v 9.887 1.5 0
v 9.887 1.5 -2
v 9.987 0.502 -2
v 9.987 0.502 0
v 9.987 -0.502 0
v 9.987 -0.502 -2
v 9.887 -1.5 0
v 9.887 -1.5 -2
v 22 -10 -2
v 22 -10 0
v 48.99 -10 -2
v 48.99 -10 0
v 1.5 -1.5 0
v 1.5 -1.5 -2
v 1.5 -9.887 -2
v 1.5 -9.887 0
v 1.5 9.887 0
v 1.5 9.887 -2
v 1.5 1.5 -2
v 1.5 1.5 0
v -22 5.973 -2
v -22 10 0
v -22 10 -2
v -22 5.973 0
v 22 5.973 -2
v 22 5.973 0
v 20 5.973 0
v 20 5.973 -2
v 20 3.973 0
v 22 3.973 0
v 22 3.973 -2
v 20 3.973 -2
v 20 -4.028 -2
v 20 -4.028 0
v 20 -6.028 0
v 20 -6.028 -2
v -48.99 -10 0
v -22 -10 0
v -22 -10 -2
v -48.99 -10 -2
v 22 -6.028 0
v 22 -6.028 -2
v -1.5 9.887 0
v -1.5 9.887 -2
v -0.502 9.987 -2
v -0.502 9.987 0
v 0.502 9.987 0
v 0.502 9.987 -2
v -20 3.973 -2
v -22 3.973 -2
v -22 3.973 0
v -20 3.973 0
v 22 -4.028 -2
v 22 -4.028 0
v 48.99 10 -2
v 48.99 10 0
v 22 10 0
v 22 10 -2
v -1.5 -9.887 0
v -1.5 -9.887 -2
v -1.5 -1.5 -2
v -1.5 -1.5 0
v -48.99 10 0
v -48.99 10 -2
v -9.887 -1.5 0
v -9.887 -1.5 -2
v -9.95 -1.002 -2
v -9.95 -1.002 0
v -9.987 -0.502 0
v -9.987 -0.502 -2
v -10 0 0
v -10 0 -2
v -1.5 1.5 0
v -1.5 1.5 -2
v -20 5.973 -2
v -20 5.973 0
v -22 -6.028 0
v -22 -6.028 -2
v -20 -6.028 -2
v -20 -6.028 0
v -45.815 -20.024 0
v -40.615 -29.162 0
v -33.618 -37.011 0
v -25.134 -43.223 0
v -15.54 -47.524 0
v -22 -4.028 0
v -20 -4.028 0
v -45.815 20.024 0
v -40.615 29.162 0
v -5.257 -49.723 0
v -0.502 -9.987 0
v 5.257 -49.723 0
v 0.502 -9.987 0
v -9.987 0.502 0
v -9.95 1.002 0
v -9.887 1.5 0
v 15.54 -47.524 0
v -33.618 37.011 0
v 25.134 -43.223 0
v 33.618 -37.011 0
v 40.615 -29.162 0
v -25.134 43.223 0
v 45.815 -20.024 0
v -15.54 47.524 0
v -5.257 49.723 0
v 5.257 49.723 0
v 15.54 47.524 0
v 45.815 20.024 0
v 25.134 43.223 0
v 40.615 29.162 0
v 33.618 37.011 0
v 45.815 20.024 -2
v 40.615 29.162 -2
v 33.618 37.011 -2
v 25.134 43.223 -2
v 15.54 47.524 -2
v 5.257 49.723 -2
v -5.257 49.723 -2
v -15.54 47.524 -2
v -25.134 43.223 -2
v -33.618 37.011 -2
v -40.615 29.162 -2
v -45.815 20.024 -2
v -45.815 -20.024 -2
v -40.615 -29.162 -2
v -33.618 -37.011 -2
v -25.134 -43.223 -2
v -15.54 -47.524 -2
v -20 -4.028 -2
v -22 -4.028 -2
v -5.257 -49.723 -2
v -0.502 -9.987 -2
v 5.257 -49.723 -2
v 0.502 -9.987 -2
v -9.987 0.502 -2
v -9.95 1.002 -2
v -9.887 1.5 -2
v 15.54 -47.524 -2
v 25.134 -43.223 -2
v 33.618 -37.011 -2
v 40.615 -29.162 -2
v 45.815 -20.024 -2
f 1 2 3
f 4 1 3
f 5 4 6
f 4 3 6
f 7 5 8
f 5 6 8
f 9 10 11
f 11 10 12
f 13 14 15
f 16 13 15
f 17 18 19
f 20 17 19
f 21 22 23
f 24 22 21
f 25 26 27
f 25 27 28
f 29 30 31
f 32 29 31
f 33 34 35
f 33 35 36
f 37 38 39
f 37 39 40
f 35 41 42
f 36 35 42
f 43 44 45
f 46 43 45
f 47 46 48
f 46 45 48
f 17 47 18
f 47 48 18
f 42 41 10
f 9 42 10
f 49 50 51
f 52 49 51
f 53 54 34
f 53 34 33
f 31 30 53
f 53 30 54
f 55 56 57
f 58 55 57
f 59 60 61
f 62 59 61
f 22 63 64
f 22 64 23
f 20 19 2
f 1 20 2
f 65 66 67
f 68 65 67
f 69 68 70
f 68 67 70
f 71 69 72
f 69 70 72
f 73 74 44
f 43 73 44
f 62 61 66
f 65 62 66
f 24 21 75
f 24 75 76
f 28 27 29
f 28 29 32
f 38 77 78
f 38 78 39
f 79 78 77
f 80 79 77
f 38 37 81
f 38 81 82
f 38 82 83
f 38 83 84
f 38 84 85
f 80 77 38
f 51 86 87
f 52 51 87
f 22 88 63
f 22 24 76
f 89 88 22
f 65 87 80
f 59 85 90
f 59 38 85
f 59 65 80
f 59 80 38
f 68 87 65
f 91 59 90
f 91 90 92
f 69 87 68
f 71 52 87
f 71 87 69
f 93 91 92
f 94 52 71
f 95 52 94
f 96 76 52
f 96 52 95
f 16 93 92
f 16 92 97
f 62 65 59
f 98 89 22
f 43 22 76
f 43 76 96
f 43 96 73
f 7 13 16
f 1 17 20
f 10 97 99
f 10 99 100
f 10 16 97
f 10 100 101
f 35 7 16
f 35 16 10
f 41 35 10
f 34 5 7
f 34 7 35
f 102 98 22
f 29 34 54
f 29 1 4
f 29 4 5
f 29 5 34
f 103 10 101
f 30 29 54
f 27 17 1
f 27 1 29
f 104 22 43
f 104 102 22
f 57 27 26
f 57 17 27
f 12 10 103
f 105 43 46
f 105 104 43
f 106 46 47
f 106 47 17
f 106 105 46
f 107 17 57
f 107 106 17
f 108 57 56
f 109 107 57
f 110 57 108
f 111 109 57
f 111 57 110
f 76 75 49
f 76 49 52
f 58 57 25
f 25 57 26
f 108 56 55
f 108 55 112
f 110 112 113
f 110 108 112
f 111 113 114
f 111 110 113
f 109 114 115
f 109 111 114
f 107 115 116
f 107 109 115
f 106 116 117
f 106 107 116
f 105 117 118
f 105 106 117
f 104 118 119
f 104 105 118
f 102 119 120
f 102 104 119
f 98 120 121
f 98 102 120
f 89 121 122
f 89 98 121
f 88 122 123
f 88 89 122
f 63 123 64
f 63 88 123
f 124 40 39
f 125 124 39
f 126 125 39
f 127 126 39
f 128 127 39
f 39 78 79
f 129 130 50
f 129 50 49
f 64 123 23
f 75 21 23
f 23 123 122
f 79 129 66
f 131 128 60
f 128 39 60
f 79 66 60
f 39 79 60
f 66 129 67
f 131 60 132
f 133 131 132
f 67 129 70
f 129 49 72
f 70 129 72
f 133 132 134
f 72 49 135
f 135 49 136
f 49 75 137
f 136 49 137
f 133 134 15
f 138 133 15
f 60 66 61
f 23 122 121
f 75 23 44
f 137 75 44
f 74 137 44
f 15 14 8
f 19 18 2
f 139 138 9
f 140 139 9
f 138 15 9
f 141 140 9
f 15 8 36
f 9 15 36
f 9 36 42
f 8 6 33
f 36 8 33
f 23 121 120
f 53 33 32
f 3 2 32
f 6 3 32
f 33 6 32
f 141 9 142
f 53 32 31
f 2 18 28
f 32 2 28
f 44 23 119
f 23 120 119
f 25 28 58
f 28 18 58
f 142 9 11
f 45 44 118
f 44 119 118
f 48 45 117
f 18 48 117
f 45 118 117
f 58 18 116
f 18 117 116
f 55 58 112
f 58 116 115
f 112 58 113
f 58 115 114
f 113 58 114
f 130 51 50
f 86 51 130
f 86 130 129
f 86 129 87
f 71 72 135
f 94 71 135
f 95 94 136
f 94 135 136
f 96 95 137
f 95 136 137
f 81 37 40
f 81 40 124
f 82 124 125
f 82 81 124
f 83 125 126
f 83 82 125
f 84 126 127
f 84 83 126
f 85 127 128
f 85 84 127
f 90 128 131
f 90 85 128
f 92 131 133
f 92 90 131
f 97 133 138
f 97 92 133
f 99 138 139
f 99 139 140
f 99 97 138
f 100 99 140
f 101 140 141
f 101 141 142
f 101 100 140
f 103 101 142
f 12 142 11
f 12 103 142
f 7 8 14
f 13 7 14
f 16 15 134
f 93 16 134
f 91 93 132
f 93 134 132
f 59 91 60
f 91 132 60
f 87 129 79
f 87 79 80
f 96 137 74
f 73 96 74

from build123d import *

# Parameters (mm, degrees)
BOSS_EXTRUDE5_DEPTH = 2
CUT_EXTRUDE17_DEPTH = 2
SKETCH11_3_W        = 3
SKETCH11_3_H        = 3
CUT_EXTRUDE18_DEPTH = 2
CUT_EXTRUDE19_DEPTH = 2
SKETCH14_W          = 2.001486185
SKETCH14_H          = 2
CUT_EXTRUDE20_DEPTH = 2
SKETCH13_W          = 2.001486185
SKETCH13_H          = 2
CUT_EXTRUDE21_DEPTH = 2


with BuildPart() as part:
    # Sketch1 → Boss-Extrude5 (new body)
    with BuildSketch(Plane.XY):
        with BuildLine():
            Line((-22, 10), (-22, -10))
            Line((-22, -10), (-48.989794856, -10))
            ThreePointArc((-48.989794856, -10), (50, 0), (-48.989794856, 10))
            Line((-48.989794856, 10), (-22, 10))
        make_face()
    extrude(amount=-BOSS_EXTRUDE5_DEPTH)

    # Sketch11 → Cut-Extrude17 (cut)
    with BuildSketch(Plane(origin=(0, 0, -2), x_dir=(-1, 0, 0), z_dir=(0, 0, -1))):
        with BuildLine():
            Line((-1.5, 1.5), (1.5, 1.5))
            Line((1.5, 1.5), (1.5, 9.886859967))
            ThreePointArc((1.5, 9.886859967), (0, 10), (-1.5, 9.886859967))
            Line((-1.5, 9.886859967), (-1.5, 1.5))
        make_face()
    extrude(amount=-CUT_EXTRUDE17_DEPTH, mode=Mode.SUBTRACT)

    # Sketch11<3> → Cut-Extrude18 (cut)
    with BuildSketch(Plane(origin=(0, 0, -2), x_dir=(-1, 0, 0), z_dir=(0, 0, -1))):
        with BuildLine():
            Line((-9.886859967, -1.5), (-1.5, -1.5))
            Line((-1.5, -1.5), (-1.5, 1.5))
            Line((-1.5, 1.5), (-9.886859967, 1.5))
            ThreePointArc((-9.886859967, 1.5), (-10, 0), (-9.886859967, -1.5))
        make_face()
        with BuildLine():
            Line((1.5, 1.5), (1.5, -1.5))
            Line((1.5, -1.5), (9.886859967, -1.5))
            ThreePointArc((9.886859967, -1.5), (9.971674876, -0.752130419), (10, 0))
            ThreePointArc((10, 0), (9.971674876, 0.752130419), (9.886859967, 1.5))
            Line((9.886859967, 1.5), (1.5, 1.5))
        make_face()
        with BuildLine():
            Line((1.5, -9.886859967), (1.5, -1.5))
            Line((1.5, -1.5), (-1.5, -1.5))
            Line((-1.5, -1.5), (-1.5, -9.886859967))
            ThreePointArc((-1.5, -9.886859967), (0, -10), (1.5, -9.886859967))
        make_face()
        Rectangle(SKETCH11_3_W, SKETCH11_3_H)
    extrude(amount=-CUT_EXTRUDE18_DEPTH, mode=Mode.SUBTRACT)

    # Sketch1<9> → Cut-Extrude19 (cut)
    with BuildSketch(Plane.XY):
        with BuildLine():
            Line((32.494897428, 10), (22, 10))
            Line((22, 10), (22, -10))
            Line((22, -10), (48.989794856, -10))
            ThreePointArc((48.989794856, -10), (49.74680765, -5.0254481), (50, 0))
            ThreePointArc((50, 0), (49.74680765, 5.0254481), (48.989794856, 10))
            Line((48.989794856, 10), (32.494897428, 10))
        make_face()
    extrude(amount=-CUT_EXTRUDE19_DEPTH, mode=Mode.SUBTRACT)

    # Sketch14 → Cut-Extrude20 (cut)
    with BuildSketch(Plane.ZY.offset(22)):
        with Locations((-0.999256907, -5.028117734)):
            Rectangle(SKETCH14_W, SKETCH14_H)
        with Locations((-0.999256907, 4.972809543)):
            Rectangle(SKETCH14_W, SKETCH14_H)
    extrude(amount=-CUT_EXTRUDE20_DEPTH, mode=Mode.SUBTRACT)

    # Sketch13 → Cut-Extrude21 (cut)
    with BuildSketch(Plane(origin=(22, 0, 0), x_dir=(0, 0, -1), z_dir=(1, 0, 0))):
        with Locations((0.999256907, -5.028117734)):
            Rectangle(SKETCH13_W, SKETCH13_H)
        with Locations((0.999256907, 4.972809543)):
            Rectangle(SKETCH13_W, SKETCH13_H)
    extrude(amount=-CUT_EXTRUDE21_DEPTH, mode=Mode.SUBTRACT)


solid = part.part
